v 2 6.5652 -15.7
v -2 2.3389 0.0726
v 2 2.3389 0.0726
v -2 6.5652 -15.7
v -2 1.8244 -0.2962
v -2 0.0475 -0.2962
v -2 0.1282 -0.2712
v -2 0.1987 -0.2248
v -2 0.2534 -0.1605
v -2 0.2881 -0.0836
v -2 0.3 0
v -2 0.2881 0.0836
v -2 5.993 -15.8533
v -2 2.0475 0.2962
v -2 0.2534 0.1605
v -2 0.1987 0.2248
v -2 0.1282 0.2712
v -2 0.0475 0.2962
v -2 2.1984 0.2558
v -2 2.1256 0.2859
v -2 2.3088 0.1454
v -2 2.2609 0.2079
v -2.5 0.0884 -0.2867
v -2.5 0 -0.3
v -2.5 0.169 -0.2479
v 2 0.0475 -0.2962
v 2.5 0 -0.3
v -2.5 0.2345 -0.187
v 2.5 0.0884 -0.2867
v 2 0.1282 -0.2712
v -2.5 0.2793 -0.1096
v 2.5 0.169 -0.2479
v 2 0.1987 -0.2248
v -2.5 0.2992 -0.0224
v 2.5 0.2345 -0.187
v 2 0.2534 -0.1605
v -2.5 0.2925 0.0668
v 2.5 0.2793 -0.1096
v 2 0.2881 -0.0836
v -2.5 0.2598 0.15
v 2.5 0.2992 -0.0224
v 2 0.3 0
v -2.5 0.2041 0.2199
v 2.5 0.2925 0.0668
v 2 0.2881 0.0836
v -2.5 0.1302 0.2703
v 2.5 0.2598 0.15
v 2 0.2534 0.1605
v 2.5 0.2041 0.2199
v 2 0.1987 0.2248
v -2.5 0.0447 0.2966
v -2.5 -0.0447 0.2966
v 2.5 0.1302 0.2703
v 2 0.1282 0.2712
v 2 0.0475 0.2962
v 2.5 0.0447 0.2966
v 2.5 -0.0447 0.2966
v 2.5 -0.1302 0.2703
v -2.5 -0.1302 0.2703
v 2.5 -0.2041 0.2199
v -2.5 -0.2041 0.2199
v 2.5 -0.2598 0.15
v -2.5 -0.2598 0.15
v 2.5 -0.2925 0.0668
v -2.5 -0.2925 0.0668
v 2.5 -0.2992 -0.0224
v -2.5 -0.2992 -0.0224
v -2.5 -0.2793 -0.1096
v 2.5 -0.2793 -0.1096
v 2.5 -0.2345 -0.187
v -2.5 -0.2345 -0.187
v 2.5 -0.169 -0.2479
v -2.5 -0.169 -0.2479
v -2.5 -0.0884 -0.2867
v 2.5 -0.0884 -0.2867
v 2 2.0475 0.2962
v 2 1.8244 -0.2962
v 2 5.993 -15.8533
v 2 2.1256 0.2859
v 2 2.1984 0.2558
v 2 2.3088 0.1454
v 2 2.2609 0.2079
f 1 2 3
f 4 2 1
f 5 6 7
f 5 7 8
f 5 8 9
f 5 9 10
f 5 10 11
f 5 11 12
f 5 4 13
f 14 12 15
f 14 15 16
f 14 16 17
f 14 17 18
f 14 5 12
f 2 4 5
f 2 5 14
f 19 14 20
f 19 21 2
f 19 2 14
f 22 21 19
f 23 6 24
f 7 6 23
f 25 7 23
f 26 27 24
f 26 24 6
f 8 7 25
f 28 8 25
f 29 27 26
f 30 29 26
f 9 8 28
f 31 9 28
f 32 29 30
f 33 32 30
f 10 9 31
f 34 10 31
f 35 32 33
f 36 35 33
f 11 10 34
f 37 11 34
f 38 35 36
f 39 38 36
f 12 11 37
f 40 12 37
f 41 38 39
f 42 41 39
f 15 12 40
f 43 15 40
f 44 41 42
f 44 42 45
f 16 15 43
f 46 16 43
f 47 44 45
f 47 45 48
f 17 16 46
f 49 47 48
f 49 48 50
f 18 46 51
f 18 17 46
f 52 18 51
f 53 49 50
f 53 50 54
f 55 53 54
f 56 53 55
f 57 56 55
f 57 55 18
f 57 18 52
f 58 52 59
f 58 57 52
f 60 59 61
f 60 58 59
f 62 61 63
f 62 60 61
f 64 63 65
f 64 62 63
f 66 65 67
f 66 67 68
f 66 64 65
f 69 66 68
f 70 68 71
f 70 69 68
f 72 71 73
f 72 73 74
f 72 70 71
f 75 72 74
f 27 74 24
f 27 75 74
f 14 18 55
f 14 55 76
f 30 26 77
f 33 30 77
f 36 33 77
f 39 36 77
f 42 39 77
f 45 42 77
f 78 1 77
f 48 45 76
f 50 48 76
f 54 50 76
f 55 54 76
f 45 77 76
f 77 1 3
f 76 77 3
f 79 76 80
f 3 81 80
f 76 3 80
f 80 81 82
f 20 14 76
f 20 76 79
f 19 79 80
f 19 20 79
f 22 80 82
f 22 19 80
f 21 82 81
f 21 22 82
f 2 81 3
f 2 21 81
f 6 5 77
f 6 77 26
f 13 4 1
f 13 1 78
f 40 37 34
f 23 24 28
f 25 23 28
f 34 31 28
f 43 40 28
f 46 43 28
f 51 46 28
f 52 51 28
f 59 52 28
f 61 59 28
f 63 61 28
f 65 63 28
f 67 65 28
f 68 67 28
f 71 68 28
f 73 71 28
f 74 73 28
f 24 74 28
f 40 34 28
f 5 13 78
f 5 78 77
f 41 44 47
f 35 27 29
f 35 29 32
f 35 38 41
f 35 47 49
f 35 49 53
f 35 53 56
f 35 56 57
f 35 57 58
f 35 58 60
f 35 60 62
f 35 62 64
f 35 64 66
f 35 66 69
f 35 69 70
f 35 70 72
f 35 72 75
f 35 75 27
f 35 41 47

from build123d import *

# Parameters (mm, degrees)
SKETCH1_R                = 0.3
BOSS_EXTRUDE1_DEPTH      = 2.5
BOSS_EXTRUDE2_DEPTH      = 2
BOSS_EXTRUDE2_DEPTH_BACK = 2


with BuildPart() as part:
    # Sketch1 → Boss-Extrude1 (new, symmetric)
    with BuildSketch(Plane(origin=(0, 0, 0), x_dir=(0, 0, -1), z_dir=(1, 0, 0))):
        Circle(SKETCH1_R)
    extrude(amount=BOSS_EXTRUDE1_DEPTH, both=True)

    # Sketch2 → Boss-Extrude2 (add, two sides: drawn at the far end of the back side and taken through both)
    with BuildSketch(Plane(origin=(0, 0, 0), x_dir=(0, 0, -1), z_dir=(1, 0, 0)).offset(-BOSS_EXTRUDE2_DEPTH_BACK)):
        with BuildLine():
            Line((-0.296211166, 0.047528362), (-0.296211166, 2.047528362))
            ThreePointArc((-0.296211166, 2.047528362), (-0.233869415, 2.231181239), (-0.07260959, 2.338931609))
            Line((-0.07260959, 2.338931609), (15.7, 6.565189611))
            Line((15.7, 6.565189611), (15.853330182, 5.992953581))
            Line((15.853330182, 5.992953581), (0.296211166, 1.824436104))
            Line((0.296211166, 1.824436104), (0.296211166, 0.047528362))
            Line((0.296211166, 0.047528362), (-0.296211166, 0.047528362))
        make_face()
    extrude(amount=BOSS_EXTRUDE2_DEPTH + BOSS_EXTRUDE2_DEPTH_BACK)


solid = part.part
